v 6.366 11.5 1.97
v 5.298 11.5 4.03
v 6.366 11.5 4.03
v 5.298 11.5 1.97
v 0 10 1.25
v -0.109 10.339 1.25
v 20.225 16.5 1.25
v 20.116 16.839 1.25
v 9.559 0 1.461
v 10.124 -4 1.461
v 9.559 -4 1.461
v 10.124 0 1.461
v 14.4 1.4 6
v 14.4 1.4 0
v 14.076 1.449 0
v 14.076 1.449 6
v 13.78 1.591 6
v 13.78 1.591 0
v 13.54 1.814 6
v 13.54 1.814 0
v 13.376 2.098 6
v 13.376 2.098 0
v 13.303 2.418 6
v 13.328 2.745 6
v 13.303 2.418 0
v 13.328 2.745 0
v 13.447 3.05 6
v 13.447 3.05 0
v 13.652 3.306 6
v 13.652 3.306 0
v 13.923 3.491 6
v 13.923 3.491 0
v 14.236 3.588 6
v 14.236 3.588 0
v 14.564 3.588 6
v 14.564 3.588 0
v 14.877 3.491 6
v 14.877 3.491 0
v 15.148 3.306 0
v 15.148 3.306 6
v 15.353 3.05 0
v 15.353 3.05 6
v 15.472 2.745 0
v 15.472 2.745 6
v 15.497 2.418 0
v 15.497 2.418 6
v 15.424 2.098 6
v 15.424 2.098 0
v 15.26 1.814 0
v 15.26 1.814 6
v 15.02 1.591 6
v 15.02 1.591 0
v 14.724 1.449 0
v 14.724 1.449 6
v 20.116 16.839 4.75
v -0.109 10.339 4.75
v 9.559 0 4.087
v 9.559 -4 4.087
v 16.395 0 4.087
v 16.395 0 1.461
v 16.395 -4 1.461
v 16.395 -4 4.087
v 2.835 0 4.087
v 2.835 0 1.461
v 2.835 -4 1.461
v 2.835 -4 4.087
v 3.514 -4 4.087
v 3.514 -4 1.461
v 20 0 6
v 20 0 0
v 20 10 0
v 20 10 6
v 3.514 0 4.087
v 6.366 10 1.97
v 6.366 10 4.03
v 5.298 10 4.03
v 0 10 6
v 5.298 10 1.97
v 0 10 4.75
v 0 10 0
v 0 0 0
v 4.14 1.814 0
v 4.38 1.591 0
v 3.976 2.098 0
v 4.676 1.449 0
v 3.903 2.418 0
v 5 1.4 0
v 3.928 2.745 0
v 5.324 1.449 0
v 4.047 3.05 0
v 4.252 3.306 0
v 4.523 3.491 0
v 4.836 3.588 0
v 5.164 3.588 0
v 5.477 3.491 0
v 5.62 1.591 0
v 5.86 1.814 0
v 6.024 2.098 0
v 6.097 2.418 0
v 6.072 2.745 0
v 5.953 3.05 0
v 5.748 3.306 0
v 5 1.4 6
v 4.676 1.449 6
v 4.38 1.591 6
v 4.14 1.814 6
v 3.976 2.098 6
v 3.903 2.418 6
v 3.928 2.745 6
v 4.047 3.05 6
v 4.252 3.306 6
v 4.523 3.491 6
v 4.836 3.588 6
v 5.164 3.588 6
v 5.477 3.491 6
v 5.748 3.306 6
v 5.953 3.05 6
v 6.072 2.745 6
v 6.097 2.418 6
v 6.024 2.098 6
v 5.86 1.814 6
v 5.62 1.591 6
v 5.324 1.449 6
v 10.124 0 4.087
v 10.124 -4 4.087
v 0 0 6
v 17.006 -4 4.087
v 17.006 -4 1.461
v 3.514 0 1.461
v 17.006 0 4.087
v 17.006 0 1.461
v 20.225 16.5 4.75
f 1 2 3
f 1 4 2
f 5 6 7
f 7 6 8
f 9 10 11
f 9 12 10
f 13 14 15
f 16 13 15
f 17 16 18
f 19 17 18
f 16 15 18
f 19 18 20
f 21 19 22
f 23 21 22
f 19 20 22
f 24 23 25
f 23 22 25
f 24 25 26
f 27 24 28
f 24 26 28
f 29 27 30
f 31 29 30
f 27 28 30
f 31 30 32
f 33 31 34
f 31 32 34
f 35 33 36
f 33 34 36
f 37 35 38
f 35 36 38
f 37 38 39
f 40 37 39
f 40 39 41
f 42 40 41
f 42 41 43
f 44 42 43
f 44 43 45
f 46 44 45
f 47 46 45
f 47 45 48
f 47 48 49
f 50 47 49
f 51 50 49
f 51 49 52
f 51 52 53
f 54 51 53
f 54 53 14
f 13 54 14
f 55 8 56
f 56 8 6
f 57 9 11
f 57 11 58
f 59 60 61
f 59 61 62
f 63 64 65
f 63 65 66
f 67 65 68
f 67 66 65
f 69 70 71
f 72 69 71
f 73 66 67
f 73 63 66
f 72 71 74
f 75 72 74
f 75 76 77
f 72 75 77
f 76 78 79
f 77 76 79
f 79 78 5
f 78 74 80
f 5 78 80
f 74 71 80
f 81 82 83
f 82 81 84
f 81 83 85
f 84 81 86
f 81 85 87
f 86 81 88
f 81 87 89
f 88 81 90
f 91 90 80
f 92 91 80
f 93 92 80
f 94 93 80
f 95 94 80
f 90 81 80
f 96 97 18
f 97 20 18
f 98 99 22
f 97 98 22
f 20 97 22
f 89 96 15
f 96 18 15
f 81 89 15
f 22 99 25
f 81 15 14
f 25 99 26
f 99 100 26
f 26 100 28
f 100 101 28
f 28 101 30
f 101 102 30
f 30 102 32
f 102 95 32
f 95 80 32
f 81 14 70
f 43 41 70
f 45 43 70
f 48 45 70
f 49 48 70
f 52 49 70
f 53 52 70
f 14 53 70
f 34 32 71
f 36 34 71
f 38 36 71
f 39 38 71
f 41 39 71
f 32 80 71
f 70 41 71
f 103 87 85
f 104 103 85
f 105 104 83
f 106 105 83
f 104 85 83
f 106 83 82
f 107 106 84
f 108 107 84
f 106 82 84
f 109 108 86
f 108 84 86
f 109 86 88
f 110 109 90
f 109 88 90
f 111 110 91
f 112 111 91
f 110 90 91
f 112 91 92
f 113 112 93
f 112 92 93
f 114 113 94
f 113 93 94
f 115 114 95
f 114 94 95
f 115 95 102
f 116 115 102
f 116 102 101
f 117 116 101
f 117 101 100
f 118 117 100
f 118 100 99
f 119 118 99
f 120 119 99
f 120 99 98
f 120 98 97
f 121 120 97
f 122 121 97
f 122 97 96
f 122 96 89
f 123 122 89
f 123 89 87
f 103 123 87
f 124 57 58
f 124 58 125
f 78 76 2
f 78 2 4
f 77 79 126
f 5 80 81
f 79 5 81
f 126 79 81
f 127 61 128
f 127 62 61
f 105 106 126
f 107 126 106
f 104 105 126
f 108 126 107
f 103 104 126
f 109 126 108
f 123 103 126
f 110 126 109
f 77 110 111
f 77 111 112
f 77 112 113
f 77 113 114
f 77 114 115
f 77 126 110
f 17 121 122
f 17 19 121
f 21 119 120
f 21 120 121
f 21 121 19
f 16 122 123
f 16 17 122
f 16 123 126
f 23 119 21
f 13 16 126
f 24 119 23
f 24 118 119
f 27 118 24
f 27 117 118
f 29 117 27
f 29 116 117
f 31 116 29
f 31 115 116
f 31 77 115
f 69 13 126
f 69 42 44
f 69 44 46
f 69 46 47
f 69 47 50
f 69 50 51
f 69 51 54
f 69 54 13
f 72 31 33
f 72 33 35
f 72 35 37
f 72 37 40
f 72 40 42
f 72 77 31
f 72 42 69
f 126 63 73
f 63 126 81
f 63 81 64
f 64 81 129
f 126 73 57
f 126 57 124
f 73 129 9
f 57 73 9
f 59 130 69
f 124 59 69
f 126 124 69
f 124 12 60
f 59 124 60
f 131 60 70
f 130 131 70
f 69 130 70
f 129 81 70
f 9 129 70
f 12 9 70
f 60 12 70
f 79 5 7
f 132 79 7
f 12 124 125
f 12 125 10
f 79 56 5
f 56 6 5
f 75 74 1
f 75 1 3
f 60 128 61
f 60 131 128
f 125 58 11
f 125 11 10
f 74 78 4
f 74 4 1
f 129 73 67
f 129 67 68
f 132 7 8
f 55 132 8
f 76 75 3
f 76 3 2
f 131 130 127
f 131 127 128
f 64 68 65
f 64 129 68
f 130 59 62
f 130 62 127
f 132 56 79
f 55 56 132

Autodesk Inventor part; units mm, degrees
ref_plane "YZ Plane" through (0, 0, 0) normal (1, 0, 0) x (0, 1, 0)
ref_plane "XZ Plane" through (0, 0, 0) normal (0, 1, 0) x (-1, 0, 0)
ref_plane "XY Plane" through (0, 0, 0) normal (0, 0, 1) x (1, 0, 0)
sketch "Skizze1" plane through (0, 0, 0) normal (0, 0, 1) x (1, 0, 0)
  line L0 (0, 0) -> (20, 0)
  line L1 (20, 0) -> (20, 10)
  line L2 (20, 10) -> (0, 10)
  line L3 (0, 10) -> (0, 0)
  dimension "d0" = 20
  dimension "d1" = 10
extrude "Extrusion1" add sketch "Skizze1" along normal blind 6
sketch "Skizze2" plane through (0, 0, 0) normal (0, -1, 0) x (1, 0, 0)
  line L0 (2.8353, 4.0866) -> (3.5144, 4.0866)
  line L1 (3.5144, 4.0866) -> (3.5144, 1.4607)
  line L2 (3.5144, 1.4607) -> (2.8353, 1.4607)
  line L3 (2.8353, 1.4607) -> (2.8353, 4.0866)
  line L4 (9.5586, 4.0866) -> (10.1245, 4.0866)
  line L5 (10.1245, 4.0866) -> (10.1245, 1.4607)
  line L6 (10.1245, 1.4607) -> (9.5586, 1.4607)
  line L7 (9.5586, 1.4607) -> (9.5586, 4.0866)
  line L8 (16.3951, 4.0866) -> (17.0063, 4.0866)
  line L9 (17.0063, 4.0866) -> (17.0063, 1.4607)
  line L10 (17.0063, 1.4607) -> (16.3951, 1.4607)
  line L11 (16.3951, 1.4607) -> (16.3951, 4.0866)
extrude "Extrusion2" add sketch "Skizze2" along normal blind 4
sketch "Skizze3" plane through (0, 0, 6) normal (0, 0, 1) x (1, 0, 0)
  line L0 (0, 0) -> (0, 10) projected
  line L1 (20, 0) -> (0, 0) projected
  line L2 (20, 10) -> (20, 0) projected
  line L3 (0, 2.5) -> (20, 2.5)
  point P0 (5, 2.5)
  point P1 (14.4, 2.5)
  dimension "d6" = 2.5
  dimension "d7" = 5
  dimension "d8" = 9.4
  dimension "d9" = 5.6
hole "Bohrung1" at (5, 2.5, 6) at (14.4, 2.5, 6) direction (0, 0, -1) diameter 2.2 end through all
sketch "Skizze4" plane through (0, 10, 0) normal (0, 1, 0) x (1, 0, 0)
  line L0 (5.2978, -1.9699) -> (6.366, -1.9699)
  line L1 (6.366, -1.9699) -> (6.366, -4.0301)
  line L2 (6.366, -4.0301) -> (5.2978, -4.0301)
  line L3 (5.2978, -4.0301) -> (5.2978, -1.9699)
extrude "Extrusion3" add sketch "Skizze4" along normal blind 1.5
ref_plane "Arbeitsebene1" through (0, 0, 3) normal (0, 0, 1) x (1, 0, 0)
sketch "Skizze5" plane through (0, 0, 3) normal (0, 0, 1) x (1, 0, 0)
  circle A0 centre (14.4, 2.5) radius 1.1 projected
  circle A1 centre (5, 2.5) radius 1.1 projected
  line L0 (0, 0) -> (0, 10) projected
  line L1 (20, 0) -> (0, 0) projected
  line L2 (20, 10) -> (20, 0) projected
  line L3 (0, 10) -> (20, 10) projected
  line L4 (0, 10) -> (20.2246, 16.5)
  line L5 (20.2246, 16.5) -> (20.1156, 16.839)
  line L6 (20.1156, 16.839) -> (-0.1089, 10.339)
  line L7 (-0.1089, 10.339) -> (0, 10)
  dimension "d20" = 14
extrude "Extrusion4" add sketch "Skizze5" along normal mid plane 3.5 contours L7 L6 L5 L4
properties part number "Schalter"
